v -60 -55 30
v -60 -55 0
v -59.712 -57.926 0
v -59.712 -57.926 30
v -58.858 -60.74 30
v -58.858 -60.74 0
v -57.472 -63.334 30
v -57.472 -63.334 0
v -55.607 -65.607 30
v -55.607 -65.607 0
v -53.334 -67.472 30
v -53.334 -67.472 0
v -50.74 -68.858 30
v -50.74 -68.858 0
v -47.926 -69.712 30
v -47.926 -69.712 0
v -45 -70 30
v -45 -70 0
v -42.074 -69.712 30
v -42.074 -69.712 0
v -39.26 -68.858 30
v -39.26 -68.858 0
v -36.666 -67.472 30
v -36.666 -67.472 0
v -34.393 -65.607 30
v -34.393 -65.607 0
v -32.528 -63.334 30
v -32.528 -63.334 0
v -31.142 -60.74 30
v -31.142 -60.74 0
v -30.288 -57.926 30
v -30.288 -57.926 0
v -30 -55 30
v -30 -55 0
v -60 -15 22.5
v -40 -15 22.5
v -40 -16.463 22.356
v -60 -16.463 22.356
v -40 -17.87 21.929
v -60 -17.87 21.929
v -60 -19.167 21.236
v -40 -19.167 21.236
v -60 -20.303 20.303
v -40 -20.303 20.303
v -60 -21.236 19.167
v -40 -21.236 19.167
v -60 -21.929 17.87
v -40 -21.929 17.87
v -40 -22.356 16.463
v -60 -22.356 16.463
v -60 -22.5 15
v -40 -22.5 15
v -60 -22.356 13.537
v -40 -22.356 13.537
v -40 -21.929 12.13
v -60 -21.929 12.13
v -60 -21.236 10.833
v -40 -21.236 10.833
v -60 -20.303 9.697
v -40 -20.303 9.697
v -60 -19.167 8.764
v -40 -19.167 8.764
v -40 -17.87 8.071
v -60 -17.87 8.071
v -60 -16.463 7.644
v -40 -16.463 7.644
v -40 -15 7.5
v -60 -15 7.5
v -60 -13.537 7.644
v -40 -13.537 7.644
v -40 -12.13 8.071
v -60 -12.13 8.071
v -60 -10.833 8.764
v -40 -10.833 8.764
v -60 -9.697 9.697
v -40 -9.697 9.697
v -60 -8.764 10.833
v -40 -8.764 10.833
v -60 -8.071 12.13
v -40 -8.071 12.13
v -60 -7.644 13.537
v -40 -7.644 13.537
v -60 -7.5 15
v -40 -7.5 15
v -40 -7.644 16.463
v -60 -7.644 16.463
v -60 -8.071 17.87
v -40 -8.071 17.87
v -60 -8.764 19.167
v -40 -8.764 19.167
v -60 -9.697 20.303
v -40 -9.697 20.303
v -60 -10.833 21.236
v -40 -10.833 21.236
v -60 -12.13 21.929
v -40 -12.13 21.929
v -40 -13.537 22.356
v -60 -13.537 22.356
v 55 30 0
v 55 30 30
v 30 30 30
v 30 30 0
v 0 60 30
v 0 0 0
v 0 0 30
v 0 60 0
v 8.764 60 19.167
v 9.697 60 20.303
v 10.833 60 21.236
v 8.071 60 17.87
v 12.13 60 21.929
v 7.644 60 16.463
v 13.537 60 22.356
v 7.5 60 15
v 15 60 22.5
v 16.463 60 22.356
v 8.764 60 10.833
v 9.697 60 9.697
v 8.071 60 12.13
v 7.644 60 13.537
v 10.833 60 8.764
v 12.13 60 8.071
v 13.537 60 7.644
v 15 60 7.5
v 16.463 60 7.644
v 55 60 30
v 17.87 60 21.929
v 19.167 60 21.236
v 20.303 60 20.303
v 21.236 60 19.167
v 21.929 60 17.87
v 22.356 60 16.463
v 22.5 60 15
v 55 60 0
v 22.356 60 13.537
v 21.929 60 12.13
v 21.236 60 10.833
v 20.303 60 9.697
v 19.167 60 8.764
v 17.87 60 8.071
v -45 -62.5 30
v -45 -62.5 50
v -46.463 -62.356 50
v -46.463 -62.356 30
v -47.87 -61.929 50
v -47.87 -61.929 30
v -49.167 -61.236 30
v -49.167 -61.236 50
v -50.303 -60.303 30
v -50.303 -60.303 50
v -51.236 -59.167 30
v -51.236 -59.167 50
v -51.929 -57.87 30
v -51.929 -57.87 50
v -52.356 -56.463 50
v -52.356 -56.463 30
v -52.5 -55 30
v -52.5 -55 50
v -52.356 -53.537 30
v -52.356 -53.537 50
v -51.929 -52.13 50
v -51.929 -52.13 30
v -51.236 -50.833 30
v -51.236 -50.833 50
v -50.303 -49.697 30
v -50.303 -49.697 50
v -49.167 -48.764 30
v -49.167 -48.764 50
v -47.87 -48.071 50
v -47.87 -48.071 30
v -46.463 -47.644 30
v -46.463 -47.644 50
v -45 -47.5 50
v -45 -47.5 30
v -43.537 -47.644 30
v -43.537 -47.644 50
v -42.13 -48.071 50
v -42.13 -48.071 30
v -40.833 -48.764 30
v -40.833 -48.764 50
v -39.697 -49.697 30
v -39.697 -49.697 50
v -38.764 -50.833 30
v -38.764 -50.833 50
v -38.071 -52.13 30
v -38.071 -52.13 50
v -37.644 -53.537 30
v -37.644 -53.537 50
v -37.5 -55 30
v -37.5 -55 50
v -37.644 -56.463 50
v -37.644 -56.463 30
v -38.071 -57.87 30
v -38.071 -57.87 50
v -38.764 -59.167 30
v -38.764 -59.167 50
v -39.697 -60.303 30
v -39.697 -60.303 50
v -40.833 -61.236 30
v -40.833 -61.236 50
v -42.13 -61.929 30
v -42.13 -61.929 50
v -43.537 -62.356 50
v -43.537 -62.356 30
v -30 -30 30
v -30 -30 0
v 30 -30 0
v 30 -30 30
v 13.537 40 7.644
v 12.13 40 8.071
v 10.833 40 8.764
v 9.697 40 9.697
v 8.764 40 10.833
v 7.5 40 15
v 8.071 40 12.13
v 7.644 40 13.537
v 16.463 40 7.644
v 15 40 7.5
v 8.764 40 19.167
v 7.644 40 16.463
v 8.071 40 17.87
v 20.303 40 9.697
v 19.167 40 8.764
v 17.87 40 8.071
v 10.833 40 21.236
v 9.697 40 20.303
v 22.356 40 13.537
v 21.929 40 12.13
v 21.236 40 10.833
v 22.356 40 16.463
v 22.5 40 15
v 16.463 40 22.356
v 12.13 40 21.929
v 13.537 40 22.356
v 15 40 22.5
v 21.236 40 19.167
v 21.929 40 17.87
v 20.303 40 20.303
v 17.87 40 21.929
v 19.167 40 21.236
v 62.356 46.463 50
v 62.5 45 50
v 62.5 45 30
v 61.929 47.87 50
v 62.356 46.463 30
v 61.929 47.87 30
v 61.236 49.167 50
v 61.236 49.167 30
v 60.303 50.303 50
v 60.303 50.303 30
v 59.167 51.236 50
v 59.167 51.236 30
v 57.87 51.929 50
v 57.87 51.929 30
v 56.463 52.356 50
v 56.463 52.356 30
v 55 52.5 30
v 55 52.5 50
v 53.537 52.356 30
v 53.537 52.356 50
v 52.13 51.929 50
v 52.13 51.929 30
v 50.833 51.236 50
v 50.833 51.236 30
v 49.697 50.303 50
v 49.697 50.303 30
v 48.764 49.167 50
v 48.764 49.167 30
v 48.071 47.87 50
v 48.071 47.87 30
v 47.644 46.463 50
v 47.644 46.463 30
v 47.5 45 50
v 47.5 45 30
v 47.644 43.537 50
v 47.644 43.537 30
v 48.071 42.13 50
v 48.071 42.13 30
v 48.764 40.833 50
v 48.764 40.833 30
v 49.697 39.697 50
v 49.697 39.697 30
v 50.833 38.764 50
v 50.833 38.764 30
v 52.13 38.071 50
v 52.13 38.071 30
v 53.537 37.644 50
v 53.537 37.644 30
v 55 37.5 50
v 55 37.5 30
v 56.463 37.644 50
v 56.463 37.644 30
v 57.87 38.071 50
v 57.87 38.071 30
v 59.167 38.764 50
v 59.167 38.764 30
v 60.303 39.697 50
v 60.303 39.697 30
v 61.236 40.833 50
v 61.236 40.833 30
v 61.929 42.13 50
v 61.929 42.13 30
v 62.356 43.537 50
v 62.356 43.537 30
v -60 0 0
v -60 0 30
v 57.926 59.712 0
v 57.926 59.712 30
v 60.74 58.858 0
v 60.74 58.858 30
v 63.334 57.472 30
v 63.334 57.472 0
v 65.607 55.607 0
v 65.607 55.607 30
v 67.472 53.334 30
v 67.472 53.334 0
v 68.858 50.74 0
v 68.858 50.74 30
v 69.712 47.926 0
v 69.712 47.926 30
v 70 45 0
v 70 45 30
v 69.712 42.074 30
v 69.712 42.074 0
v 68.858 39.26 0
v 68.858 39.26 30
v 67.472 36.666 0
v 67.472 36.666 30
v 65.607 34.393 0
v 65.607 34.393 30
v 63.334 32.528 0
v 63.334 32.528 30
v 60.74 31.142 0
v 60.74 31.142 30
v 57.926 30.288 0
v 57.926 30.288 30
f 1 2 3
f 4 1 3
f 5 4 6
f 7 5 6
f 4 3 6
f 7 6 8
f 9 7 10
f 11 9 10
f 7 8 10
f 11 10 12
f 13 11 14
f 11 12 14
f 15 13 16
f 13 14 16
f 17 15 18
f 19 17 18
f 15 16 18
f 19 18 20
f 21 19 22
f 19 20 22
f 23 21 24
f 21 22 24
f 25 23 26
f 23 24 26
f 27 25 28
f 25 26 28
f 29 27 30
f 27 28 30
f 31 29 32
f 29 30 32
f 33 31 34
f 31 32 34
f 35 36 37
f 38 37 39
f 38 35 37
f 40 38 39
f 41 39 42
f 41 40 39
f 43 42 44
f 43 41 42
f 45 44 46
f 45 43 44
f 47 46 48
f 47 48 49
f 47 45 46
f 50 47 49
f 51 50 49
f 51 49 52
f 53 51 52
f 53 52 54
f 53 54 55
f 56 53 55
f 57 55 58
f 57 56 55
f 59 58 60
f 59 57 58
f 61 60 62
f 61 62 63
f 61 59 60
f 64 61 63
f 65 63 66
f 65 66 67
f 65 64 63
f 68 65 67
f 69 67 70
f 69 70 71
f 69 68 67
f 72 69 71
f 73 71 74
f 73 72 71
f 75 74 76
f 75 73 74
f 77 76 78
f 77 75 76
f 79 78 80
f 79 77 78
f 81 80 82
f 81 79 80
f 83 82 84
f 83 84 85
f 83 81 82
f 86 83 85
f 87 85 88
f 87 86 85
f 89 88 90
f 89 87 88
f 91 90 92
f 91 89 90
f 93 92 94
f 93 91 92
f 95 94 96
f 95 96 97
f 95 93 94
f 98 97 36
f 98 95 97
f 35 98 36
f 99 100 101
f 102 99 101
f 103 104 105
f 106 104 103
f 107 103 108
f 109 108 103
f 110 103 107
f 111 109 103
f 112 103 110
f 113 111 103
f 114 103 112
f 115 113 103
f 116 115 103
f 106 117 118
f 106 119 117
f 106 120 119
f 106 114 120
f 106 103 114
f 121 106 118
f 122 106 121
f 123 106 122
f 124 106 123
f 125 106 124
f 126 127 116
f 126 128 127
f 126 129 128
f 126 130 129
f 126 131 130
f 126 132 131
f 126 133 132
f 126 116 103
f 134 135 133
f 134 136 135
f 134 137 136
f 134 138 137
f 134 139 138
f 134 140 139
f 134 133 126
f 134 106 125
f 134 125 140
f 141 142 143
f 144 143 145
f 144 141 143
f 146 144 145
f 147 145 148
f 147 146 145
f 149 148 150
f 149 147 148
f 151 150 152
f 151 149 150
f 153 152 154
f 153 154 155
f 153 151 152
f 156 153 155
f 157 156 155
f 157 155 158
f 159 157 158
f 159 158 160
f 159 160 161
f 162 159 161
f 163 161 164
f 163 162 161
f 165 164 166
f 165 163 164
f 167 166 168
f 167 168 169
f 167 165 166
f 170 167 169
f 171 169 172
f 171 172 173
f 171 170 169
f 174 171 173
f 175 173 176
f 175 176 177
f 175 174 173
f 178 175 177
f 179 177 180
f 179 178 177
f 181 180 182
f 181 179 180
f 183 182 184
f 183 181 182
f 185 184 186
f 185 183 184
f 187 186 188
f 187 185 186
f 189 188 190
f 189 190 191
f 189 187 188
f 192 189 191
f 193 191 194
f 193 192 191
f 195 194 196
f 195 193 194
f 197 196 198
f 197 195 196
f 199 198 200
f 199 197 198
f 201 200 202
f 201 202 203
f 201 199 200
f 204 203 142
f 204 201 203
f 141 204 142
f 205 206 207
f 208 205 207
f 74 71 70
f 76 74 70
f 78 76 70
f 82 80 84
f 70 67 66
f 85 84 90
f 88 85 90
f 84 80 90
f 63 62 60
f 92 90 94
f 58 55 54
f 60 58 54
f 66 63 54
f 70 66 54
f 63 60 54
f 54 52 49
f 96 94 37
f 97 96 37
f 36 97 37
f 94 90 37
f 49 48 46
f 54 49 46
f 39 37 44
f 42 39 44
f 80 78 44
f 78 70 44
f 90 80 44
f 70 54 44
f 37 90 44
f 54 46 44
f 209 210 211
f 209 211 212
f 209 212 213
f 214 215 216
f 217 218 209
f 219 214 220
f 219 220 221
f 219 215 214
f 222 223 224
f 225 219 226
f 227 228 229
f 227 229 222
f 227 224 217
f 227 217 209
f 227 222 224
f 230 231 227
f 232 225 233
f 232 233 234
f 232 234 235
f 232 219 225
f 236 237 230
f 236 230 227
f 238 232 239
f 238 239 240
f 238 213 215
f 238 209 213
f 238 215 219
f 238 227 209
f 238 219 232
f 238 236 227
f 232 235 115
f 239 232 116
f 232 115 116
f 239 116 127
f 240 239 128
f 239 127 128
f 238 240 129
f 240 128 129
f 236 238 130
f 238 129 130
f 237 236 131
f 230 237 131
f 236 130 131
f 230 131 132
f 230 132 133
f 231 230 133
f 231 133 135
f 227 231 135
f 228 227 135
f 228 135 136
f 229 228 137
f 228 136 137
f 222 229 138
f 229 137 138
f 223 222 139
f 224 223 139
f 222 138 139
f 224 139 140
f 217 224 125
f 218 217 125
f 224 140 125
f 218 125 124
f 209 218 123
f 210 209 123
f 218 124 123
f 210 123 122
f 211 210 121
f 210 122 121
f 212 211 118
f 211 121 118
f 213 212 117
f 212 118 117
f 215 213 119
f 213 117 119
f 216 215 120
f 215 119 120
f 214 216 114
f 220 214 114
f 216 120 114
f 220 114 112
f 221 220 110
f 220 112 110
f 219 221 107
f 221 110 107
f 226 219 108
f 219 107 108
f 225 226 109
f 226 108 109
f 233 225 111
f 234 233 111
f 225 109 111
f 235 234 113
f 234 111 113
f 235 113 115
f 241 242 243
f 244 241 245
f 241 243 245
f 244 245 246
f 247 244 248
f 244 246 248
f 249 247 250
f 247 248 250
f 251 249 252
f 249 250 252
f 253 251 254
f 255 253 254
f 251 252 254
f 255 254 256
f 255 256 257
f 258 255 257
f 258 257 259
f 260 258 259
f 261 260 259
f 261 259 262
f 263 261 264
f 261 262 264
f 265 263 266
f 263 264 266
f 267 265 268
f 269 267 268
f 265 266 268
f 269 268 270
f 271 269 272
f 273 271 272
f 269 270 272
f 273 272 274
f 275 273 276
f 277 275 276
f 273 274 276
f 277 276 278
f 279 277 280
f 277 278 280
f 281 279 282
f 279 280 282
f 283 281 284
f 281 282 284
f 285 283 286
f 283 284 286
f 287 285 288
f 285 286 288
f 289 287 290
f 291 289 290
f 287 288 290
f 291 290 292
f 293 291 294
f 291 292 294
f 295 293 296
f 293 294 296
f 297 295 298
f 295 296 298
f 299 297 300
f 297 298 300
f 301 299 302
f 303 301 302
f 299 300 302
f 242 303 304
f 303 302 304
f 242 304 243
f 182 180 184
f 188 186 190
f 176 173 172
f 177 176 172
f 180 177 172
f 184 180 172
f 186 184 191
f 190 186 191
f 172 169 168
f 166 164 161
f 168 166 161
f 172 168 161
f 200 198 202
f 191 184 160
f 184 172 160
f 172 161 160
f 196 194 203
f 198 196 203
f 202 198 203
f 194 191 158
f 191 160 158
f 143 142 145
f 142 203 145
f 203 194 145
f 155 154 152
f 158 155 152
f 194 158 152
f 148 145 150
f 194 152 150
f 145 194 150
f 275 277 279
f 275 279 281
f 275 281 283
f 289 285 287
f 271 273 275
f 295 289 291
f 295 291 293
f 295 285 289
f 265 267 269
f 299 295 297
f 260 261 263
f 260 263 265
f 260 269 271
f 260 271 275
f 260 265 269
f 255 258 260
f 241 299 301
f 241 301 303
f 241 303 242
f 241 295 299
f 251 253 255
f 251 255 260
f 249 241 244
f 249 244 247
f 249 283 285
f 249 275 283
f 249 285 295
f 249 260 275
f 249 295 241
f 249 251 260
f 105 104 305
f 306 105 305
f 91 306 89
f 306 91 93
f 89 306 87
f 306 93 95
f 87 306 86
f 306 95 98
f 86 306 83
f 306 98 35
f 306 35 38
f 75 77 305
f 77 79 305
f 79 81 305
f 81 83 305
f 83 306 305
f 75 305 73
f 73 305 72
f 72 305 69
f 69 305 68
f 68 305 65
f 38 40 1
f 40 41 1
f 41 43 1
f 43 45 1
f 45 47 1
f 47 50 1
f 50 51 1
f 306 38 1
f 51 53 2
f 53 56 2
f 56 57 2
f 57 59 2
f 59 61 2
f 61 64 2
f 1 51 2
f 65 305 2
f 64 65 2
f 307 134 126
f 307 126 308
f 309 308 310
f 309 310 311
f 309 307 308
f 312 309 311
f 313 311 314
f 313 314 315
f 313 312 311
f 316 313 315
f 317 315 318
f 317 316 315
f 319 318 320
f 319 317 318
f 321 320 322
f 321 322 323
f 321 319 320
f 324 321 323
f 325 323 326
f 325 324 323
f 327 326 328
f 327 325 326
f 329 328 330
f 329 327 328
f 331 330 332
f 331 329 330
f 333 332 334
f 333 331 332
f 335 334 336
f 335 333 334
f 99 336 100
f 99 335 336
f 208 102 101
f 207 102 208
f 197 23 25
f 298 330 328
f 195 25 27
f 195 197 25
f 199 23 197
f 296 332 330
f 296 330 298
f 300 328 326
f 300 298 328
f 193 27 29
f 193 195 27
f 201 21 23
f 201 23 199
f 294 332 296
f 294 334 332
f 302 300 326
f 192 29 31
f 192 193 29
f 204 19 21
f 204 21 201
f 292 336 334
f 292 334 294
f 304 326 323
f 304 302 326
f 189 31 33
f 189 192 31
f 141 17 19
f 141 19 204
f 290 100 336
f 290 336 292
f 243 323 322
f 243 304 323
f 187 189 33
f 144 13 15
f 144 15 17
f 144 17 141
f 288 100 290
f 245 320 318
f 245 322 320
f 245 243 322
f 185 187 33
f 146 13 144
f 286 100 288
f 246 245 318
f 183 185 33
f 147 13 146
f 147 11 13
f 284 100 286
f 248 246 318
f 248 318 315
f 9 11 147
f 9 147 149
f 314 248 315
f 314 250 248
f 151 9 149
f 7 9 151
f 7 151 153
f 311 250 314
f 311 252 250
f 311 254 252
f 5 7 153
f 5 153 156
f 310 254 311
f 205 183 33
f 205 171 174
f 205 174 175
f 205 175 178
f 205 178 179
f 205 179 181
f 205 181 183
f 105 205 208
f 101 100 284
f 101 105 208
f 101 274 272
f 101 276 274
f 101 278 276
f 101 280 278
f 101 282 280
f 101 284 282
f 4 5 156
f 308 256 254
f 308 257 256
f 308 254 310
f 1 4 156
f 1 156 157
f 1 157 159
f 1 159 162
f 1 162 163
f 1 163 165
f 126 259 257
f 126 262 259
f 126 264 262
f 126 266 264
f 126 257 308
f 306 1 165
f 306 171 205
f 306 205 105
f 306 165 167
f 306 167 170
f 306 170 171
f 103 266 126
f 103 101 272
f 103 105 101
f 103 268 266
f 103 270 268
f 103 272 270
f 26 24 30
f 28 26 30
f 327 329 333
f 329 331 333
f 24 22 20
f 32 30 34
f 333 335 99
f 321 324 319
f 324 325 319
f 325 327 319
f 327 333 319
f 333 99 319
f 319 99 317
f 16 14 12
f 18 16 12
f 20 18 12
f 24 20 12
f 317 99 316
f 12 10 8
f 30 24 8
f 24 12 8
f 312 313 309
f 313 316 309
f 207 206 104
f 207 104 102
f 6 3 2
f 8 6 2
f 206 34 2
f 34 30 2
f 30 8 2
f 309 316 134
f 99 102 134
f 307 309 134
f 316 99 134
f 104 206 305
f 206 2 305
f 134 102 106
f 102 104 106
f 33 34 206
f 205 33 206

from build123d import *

# Parameters (mm, degrees)
BOSS_EXTRUDE1_DEPTH = 30
SKETCH2_R           = 7.5
BOSS_EXTRUDE2_DEPTH = 20
SKETCH3_R           = 7.5
CUT_EXTRUDE1_DEPTH  = 20


with BuildPart() as part:
    # Sketch1 → Boss-Extrude1 (new body)
    with BuildSketch(Plane.XY):
        with BuildLine():
            Line((0, 0), (0, 60))
            Line((0, 60), (55, 60))
            ThreePointArc((55, 60), (70, 45), (55, 30))
            Line((55, 30), (30, 30))
            Line((30, 30), (30, -30))
            Line((30, -30), (0, 0))
        make_face()
    boss_extrude1 = extrude(amount=BOSS_EXTRUDE1_DEPTH)

    # Sketch2 → Boss-Extrude2 (add)
    with BuildSketch(Plane.XY.offset(30)):
        with Locations((55, 45)):
            Circle(SKETCH2_R)
    boss_extrude2 = extrude(amount=BOSS_EXTRUDE2_DEPTH)

    # Sketch3 → Cut-Extrude1 (cut)
    with BuildSketch(Plane(origin=(0, 60, 0), x_dir=(1, 0, 0), z_dir=(0, 1, 0))):
        with Locations(Location((15, -15, 0), (0, 0, 270))):
            Circle(SKETCH3_R)
    cut_extrude1 = extrude(amount=-CUT_EXTRUDE1_DEPTH, mode=Mode.SUBTRACT)

    # Mirror1: Boss-Extrude1, Boss-Extrude2, Cut-Extrude1 across plane
    add(boss_extrude1.mirror(Plane(origin=(30, -30, 30), x_dir=(0, 0, 1), z_dir=(0.7071067811865512, 0.7071067811865439, 0))))
    add(boss_extrude2.mirror(Plane(origin=(30, -30, 30), x_dir=(0, 0, 1), z_dir=(0.7071067811865512, 0.7071067811865439, 0))))
    add(cut_extrude1.mirror(Plane(origin=(30, -30, 30), x_dir=(0, 0, 1), z_dir=(0.7071067811865512, 0.7071067811865439, 0))), mode=Mode.SUBTRACT)


solid = part.part
